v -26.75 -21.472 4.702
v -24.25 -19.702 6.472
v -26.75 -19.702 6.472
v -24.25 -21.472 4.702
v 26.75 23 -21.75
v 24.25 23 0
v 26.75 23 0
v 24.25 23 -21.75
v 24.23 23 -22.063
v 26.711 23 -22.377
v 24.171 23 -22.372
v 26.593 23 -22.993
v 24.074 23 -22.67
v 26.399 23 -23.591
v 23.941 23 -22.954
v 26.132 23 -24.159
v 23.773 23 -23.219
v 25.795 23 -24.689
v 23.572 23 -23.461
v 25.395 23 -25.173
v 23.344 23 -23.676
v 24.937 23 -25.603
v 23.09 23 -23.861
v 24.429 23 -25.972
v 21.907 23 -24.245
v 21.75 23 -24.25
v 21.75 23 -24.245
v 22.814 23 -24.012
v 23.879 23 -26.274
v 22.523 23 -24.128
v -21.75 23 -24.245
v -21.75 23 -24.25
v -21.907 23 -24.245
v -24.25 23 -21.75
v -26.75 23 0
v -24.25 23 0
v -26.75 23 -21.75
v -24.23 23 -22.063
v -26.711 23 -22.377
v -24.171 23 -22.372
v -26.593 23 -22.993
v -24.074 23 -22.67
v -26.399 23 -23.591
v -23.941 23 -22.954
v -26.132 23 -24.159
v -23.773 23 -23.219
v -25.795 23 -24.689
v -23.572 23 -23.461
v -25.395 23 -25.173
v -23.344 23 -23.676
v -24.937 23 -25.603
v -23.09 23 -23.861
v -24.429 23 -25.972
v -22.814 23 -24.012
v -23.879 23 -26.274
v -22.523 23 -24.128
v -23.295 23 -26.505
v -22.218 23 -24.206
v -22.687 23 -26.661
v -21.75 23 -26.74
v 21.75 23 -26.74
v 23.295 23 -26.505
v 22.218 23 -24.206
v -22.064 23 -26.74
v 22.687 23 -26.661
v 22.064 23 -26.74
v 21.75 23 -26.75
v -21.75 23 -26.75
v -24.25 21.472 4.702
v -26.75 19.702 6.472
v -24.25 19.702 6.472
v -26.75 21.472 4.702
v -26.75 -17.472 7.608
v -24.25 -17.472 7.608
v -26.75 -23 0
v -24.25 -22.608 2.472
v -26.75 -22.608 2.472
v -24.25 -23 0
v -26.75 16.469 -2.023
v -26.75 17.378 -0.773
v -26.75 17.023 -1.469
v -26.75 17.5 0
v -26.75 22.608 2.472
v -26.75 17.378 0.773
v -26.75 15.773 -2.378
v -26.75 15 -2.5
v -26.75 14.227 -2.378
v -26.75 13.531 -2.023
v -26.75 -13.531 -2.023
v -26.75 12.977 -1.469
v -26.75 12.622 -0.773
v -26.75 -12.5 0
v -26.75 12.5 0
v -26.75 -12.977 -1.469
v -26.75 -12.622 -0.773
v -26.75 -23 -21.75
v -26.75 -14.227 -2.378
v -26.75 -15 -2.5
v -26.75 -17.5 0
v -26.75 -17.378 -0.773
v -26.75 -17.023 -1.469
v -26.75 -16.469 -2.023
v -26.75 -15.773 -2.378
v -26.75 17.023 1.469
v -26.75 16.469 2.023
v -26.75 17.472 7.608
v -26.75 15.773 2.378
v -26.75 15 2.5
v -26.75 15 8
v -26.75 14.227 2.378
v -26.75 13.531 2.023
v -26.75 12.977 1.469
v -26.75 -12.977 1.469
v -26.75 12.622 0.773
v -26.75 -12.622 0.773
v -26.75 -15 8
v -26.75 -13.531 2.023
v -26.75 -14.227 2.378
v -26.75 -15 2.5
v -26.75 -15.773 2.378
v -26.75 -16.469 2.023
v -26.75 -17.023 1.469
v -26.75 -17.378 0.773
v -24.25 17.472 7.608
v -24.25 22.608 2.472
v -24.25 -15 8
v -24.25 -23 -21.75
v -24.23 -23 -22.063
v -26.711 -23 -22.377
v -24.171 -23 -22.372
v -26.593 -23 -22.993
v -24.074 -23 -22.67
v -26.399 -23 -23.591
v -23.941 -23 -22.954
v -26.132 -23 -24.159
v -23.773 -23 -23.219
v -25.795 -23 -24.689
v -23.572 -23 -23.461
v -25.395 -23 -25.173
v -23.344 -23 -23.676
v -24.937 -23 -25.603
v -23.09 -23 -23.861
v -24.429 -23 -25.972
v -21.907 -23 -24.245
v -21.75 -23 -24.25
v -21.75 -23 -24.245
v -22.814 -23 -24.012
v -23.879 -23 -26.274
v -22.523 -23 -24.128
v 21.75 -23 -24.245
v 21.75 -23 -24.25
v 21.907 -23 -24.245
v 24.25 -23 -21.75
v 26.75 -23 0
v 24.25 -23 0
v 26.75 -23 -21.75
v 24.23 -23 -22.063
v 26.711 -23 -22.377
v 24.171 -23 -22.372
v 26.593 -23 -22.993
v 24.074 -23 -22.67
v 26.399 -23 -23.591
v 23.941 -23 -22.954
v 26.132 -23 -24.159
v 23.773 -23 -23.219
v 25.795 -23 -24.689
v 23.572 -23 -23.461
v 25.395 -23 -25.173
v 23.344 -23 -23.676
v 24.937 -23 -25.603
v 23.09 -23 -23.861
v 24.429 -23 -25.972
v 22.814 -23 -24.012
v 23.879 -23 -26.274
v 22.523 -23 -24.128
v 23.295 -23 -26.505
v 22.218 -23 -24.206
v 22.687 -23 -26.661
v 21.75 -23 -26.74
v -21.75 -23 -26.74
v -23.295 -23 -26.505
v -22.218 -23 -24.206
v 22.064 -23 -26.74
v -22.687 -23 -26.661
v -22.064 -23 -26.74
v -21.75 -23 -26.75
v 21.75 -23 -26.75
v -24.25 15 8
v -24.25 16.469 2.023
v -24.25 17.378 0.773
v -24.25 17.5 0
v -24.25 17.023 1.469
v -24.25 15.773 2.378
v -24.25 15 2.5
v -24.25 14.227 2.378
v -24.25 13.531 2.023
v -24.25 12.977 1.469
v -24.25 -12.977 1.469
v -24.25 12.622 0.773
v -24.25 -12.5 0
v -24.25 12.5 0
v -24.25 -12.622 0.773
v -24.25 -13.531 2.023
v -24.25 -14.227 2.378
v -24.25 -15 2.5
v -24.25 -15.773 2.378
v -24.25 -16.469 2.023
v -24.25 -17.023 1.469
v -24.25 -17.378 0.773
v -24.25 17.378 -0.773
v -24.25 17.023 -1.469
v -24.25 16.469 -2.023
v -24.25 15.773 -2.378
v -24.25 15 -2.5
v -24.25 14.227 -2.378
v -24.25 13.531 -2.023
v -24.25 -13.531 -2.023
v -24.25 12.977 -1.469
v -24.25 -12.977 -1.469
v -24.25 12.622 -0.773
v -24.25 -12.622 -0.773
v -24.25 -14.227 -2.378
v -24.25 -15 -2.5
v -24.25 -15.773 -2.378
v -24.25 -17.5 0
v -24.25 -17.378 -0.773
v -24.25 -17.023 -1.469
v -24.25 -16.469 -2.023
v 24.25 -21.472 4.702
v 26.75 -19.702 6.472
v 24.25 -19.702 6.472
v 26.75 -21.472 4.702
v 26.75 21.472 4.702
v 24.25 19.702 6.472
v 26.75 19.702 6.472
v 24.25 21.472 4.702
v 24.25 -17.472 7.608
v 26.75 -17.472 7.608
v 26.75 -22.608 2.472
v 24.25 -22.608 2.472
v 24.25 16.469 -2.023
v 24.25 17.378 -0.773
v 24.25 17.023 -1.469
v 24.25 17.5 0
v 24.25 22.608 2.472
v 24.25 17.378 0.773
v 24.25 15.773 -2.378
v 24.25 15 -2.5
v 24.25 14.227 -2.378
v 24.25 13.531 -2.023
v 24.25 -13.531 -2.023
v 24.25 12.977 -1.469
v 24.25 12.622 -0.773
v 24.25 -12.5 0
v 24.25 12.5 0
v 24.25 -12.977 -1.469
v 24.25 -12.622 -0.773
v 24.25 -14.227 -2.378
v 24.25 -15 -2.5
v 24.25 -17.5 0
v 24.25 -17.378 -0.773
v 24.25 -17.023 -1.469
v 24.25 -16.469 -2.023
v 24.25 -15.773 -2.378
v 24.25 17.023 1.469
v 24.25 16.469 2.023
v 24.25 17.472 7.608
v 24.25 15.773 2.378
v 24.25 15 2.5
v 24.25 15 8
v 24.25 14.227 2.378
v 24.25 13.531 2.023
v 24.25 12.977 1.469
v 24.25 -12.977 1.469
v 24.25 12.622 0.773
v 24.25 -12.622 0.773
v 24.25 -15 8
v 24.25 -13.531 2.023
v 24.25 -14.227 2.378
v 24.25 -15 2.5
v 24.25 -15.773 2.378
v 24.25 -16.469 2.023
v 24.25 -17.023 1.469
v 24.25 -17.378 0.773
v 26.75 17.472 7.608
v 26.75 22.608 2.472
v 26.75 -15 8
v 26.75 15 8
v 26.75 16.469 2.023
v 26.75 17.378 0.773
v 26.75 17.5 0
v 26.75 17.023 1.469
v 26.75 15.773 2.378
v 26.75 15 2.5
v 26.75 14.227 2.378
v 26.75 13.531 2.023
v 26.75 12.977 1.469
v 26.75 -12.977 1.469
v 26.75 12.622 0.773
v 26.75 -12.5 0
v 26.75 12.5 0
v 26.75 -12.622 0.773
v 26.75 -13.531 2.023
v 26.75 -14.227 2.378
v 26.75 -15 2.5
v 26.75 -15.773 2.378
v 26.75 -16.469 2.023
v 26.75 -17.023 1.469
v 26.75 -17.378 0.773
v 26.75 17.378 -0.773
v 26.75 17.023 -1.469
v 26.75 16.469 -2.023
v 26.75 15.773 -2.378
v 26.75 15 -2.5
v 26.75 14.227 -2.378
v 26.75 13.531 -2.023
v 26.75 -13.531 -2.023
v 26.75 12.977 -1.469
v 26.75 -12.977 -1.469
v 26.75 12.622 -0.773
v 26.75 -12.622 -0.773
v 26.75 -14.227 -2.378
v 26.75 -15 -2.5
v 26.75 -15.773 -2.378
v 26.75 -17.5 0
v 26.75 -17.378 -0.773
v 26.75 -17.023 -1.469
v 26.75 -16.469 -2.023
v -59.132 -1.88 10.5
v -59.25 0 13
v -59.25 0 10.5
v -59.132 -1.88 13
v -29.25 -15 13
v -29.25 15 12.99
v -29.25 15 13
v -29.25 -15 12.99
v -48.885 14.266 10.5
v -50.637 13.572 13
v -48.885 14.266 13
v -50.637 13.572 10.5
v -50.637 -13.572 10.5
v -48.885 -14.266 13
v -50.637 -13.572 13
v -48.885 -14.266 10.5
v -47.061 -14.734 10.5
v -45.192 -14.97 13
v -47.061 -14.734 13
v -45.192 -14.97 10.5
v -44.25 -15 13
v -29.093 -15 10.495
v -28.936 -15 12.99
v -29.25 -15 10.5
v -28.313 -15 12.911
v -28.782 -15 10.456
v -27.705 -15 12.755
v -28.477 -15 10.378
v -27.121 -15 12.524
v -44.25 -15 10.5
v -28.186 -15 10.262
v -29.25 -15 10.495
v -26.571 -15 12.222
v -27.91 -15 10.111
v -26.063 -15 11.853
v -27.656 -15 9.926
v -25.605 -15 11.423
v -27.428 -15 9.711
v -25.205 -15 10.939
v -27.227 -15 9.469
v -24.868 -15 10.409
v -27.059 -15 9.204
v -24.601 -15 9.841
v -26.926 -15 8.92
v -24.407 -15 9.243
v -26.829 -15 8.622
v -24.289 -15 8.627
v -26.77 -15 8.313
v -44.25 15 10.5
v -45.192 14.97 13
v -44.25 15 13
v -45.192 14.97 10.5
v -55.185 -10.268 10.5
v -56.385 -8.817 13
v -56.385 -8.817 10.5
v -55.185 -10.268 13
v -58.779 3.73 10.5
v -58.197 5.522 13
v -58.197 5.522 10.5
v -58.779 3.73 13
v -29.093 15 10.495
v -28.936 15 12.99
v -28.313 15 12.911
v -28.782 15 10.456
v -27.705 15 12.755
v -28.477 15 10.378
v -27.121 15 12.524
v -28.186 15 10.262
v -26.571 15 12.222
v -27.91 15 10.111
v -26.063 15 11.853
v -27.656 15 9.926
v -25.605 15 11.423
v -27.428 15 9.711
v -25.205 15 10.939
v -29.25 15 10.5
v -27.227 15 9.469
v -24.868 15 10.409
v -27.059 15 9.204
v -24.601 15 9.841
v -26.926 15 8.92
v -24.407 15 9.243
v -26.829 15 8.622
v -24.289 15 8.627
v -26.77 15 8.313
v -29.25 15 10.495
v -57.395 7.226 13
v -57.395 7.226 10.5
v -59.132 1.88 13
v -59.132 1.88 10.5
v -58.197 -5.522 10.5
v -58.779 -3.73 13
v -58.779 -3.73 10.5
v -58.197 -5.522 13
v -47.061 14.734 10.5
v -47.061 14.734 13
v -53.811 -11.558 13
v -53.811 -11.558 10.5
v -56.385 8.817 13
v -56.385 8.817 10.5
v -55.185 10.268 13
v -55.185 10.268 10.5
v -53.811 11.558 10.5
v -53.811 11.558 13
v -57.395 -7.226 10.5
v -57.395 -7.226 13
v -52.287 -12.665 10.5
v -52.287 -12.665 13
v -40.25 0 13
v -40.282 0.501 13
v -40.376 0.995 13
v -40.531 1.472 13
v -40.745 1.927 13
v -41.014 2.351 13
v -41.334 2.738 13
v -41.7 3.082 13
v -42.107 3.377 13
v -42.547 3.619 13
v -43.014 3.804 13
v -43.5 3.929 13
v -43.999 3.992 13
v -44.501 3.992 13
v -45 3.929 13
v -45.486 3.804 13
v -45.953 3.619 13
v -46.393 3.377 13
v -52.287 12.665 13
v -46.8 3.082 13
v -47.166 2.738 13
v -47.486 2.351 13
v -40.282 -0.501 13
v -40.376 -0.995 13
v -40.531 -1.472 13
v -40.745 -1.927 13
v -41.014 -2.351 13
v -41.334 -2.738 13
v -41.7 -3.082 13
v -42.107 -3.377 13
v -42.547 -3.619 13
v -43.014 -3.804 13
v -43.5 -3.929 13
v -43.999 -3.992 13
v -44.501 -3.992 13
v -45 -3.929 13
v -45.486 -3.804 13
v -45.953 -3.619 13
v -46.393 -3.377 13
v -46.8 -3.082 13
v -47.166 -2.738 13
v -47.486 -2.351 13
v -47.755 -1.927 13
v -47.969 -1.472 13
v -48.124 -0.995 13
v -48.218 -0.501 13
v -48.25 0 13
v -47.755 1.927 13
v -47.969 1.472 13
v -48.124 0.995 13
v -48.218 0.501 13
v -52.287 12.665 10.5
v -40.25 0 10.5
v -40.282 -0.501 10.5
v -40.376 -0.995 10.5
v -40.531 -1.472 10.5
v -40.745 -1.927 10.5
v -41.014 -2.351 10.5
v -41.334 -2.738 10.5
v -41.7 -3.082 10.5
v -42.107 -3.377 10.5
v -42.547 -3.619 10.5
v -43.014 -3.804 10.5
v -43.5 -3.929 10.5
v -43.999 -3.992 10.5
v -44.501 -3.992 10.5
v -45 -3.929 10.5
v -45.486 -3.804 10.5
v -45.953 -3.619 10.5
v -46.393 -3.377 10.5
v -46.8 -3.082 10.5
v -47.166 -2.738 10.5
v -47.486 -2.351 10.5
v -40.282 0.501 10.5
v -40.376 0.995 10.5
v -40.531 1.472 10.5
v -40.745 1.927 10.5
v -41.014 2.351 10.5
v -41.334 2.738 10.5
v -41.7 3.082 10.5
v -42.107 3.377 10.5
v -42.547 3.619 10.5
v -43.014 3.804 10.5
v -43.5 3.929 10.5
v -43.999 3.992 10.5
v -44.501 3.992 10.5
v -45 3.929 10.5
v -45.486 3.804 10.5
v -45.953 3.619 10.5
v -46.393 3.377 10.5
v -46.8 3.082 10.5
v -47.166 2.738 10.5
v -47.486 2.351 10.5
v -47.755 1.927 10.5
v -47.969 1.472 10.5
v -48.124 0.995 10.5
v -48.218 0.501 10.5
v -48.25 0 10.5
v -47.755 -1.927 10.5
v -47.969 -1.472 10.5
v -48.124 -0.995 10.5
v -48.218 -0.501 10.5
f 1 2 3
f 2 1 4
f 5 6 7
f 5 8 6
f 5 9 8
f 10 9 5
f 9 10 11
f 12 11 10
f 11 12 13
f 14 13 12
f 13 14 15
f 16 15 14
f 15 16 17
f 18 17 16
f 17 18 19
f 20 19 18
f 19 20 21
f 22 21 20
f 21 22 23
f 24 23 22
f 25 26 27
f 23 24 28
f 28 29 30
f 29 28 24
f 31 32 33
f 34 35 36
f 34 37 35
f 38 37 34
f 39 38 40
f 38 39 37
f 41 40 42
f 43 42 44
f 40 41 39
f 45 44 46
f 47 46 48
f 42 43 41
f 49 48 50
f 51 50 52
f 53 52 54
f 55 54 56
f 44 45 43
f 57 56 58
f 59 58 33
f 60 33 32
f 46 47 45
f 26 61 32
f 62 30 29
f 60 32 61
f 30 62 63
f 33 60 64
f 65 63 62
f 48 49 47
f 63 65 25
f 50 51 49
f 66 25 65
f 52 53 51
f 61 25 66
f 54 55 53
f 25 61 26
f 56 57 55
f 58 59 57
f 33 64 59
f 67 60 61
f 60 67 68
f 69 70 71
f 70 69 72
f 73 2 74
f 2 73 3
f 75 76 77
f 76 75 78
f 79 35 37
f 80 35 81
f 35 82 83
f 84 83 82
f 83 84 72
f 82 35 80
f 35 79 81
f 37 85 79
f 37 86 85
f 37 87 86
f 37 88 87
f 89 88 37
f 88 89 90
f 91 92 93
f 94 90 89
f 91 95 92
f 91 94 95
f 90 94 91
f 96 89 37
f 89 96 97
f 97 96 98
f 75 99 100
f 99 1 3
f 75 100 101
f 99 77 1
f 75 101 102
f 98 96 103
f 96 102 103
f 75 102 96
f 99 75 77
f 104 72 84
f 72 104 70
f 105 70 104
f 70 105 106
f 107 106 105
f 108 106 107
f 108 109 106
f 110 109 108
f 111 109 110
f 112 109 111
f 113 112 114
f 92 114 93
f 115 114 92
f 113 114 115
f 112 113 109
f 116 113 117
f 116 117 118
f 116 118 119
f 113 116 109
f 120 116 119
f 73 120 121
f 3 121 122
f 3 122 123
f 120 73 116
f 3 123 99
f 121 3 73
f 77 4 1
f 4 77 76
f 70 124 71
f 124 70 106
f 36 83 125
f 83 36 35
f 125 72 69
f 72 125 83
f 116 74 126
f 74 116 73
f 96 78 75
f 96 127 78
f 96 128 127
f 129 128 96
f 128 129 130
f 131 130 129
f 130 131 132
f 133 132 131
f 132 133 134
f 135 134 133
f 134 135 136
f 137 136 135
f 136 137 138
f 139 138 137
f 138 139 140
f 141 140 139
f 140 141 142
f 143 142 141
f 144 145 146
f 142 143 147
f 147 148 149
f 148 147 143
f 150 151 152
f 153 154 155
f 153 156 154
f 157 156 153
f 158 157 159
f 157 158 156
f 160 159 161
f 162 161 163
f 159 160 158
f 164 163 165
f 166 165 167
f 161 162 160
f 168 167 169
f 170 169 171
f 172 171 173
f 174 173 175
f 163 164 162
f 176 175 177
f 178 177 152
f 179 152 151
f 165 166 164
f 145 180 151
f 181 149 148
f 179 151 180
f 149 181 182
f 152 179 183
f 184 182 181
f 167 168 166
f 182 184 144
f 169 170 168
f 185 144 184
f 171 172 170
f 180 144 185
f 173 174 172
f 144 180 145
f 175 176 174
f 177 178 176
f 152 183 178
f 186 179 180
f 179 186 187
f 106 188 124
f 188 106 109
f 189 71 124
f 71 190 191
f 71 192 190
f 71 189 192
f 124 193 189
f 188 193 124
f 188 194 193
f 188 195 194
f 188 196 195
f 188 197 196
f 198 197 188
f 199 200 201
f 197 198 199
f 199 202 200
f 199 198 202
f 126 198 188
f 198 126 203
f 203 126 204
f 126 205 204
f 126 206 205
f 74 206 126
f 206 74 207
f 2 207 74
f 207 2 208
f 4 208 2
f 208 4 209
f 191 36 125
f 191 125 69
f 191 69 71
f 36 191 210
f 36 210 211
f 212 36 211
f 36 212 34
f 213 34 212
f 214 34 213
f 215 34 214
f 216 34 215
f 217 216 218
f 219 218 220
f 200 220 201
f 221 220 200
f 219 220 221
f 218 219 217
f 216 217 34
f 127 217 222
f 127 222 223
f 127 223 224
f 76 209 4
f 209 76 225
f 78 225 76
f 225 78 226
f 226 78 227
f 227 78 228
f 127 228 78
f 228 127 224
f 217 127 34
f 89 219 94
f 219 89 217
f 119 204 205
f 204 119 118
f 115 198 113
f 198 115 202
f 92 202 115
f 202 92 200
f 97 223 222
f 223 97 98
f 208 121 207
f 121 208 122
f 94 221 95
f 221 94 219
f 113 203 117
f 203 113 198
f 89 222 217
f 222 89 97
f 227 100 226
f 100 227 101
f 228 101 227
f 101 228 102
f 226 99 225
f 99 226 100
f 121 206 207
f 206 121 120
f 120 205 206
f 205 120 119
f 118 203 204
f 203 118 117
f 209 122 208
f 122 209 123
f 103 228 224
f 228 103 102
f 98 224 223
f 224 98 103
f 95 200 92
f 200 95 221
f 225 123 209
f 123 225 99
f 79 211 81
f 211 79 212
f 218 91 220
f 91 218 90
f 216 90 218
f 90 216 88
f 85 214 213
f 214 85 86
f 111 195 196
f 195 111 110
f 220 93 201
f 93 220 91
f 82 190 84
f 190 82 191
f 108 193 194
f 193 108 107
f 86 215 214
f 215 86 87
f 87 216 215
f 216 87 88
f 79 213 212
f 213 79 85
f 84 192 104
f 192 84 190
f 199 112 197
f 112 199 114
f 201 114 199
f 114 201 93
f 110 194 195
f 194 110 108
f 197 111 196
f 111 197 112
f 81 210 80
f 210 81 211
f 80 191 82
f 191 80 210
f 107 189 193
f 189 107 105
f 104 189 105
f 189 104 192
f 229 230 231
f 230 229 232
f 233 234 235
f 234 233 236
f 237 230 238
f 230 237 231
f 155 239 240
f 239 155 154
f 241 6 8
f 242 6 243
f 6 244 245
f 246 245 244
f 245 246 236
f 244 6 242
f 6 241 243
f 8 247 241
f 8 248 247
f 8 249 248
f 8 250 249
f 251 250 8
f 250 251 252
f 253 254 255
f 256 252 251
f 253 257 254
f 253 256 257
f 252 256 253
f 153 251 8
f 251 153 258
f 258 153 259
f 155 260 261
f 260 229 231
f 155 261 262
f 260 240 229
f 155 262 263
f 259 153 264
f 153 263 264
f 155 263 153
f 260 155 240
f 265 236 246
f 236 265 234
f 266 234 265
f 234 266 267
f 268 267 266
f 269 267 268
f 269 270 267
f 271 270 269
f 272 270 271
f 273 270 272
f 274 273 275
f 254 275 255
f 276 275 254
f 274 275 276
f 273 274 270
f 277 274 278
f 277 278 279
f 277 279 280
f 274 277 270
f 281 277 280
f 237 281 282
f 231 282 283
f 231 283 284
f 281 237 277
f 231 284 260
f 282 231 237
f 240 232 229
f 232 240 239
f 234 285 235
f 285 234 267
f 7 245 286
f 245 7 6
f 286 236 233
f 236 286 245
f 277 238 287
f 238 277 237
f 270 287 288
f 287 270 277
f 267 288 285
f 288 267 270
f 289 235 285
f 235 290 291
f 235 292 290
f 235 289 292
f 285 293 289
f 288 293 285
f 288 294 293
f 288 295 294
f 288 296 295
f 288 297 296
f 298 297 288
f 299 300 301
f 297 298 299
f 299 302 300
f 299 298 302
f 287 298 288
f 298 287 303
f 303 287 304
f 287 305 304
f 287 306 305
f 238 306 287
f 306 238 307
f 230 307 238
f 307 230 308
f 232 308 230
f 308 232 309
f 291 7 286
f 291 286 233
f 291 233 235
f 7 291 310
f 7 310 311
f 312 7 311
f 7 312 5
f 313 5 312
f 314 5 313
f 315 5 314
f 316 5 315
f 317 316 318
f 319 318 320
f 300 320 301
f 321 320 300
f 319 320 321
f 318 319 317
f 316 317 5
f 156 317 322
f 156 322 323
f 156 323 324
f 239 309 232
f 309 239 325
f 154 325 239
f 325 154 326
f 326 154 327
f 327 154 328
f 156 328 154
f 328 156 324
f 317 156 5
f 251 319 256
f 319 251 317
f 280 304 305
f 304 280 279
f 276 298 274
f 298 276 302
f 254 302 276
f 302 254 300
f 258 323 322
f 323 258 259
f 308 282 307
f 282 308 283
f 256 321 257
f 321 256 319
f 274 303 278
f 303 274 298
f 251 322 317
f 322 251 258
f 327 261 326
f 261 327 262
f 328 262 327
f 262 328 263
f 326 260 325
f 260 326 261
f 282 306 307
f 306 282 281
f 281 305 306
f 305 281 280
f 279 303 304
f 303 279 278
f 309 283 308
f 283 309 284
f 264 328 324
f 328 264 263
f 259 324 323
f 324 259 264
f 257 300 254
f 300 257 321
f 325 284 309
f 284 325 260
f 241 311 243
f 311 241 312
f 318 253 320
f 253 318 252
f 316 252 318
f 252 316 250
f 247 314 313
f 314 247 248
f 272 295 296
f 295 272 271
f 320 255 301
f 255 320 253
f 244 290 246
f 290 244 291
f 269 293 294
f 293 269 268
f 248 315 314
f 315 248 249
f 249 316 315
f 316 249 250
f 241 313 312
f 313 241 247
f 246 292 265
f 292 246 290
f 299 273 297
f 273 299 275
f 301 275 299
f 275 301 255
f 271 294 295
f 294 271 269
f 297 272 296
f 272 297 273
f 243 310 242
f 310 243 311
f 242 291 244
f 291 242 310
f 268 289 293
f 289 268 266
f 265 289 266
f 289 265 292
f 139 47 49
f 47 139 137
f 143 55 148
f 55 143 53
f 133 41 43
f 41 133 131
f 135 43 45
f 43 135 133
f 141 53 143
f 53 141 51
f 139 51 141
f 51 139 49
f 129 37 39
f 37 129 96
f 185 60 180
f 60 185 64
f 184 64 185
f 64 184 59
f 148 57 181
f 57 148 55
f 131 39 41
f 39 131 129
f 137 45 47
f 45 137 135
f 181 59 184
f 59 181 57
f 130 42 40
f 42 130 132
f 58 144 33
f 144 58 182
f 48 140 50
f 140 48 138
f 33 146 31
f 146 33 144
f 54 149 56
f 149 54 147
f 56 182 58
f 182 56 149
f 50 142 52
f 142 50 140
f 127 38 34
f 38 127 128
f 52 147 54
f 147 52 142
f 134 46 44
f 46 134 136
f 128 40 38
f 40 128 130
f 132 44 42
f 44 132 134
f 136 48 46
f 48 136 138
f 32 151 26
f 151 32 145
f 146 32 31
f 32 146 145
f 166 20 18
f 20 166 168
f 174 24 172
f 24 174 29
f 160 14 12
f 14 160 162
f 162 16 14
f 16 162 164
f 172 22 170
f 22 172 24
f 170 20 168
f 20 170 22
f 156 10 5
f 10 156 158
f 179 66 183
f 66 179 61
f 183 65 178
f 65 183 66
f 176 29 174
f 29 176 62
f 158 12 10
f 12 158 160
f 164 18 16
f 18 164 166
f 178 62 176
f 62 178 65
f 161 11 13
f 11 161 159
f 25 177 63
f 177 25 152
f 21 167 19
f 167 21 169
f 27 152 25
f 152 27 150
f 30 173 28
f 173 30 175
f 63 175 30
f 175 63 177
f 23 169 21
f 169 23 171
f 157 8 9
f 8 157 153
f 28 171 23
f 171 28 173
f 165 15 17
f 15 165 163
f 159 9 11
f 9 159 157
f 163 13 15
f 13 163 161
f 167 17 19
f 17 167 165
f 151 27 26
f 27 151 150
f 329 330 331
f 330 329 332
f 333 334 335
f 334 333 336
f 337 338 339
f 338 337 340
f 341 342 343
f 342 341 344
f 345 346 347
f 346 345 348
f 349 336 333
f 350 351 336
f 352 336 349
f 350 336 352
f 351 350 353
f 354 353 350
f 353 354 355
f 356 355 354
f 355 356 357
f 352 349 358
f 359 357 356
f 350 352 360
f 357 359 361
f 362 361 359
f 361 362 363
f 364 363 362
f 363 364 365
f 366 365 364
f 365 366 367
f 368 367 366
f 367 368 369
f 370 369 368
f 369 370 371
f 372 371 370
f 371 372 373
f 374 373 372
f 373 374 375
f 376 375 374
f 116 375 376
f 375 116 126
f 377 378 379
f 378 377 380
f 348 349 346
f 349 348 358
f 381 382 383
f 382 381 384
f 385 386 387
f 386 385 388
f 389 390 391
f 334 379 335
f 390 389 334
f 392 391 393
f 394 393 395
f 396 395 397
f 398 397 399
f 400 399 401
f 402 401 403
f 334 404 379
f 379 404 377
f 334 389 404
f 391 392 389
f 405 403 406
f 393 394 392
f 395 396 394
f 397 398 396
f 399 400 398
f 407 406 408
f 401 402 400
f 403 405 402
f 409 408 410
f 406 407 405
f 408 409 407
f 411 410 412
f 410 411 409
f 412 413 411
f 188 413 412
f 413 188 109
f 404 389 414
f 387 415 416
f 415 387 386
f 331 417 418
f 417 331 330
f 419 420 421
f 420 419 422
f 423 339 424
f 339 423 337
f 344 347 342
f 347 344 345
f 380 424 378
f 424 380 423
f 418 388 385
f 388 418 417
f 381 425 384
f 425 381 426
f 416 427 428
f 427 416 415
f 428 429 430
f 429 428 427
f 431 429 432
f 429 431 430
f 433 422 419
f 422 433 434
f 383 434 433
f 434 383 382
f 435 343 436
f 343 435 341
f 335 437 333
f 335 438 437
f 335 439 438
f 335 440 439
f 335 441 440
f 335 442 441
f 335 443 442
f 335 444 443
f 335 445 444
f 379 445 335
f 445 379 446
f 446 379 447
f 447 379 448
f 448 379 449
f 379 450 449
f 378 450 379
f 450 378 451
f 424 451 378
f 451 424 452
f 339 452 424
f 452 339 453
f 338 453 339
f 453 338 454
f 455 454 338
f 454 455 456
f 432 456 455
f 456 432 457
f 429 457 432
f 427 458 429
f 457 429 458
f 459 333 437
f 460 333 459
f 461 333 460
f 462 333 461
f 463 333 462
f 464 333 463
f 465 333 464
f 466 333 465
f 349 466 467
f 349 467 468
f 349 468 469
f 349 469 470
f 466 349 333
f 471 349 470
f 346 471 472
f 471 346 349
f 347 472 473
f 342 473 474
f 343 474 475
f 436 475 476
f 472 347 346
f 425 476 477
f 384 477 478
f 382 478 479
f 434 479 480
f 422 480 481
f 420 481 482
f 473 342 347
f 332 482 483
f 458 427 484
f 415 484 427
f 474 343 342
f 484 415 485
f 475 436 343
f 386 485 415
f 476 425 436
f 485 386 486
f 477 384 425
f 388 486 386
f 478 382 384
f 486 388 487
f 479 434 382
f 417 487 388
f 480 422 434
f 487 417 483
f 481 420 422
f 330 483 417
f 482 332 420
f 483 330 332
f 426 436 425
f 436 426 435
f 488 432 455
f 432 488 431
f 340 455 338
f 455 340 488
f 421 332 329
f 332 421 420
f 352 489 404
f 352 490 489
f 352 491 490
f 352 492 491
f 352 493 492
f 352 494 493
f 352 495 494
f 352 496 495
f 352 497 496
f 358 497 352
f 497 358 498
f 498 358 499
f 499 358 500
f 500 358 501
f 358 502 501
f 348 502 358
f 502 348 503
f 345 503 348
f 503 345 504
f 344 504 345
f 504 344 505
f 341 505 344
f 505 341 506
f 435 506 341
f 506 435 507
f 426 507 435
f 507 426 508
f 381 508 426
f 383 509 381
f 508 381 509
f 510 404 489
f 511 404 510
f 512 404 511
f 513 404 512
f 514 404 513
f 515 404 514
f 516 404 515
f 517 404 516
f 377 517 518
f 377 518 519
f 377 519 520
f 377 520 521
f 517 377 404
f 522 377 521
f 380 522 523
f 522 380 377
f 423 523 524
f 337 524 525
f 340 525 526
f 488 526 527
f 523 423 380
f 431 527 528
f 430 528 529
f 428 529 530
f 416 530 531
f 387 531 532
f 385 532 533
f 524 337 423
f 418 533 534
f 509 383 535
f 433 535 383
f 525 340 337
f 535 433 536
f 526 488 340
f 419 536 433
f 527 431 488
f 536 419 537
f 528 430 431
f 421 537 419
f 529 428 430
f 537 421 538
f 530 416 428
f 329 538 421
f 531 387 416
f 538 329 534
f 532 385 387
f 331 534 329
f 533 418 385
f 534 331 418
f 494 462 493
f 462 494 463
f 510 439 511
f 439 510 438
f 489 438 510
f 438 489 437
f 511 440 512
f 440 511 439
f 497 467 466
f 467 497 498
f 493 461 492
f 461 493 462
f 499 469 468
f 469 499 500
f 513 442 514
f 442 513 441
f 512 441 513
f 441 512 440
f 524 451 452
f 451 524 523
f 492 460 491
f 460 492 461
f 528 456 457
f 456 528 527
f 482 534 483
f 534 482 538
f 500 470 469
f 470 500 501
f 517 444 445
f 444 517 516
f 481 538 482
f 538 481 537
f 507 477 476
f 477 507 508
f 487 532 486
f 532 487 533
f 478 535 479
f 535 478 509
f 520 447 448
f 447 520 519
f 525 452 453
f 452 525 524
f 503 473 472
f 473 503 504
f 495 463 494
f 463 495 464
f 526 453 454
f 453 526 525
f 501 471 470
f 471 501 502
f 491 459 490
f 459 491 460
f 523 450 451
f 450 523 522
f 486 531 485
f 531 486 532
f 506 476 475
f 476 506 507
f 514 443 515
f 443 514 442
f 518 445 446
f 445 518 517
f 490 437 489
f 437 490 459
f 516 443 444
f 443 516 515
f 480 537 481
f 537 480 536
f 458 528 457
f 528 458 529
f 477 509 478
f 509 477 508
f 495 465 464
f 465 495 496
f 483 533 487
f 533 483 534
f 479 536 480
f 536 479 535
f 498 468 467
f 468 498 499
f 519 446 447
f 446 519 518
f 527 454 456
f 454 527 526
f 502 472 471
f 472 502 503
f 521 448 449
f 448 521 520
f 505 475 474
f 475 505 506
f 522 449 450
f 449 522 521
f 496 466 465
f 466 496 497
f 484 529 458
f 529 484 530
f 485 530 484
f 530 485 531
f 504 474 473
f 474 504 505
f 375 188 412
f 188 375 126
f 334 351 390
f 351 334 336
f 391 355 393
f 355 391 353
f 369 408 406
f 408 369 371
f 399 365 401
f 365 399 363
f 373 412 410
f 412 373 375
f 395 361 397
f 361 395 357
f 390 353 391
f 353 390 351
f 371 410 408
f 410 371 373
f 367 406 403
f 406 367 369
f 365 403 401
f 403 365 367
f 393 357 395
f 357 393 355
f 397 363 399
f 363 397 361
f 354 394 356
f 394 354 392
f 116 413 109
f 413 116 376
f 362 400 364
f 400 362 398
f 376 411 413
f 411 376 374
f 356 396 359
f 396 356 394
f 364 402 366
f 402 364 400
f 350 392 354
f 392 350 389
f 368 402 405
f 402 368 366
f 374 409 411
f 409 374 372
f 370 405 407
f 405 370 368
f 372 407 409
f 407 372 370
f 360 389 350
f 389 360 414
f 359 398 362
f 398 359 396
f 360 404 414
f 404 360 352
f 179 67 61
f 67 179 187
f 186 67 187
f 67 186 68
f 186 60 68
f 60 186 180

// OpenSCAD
//RudderSupport(50,0,-30);
RudderSupport();


    thicns = 2.5;
    tubeDia = 48.5;
    cornerRad = 8;
    height1=21.75;
    wid1 = 46;  // platform side A
    platfSideB = tubeDia - 2*thicns;
    width1=30;
    rudderBoltRad = 4;
    rudderEarRad = 15;
    holeRad = 2.5;

module RudderSupport() {
    
    $fn=50;
    
    pz = 0;// - height1;
    px = 0; //+ tubeDia;
    py = 0; 
    
    translate([px-platfSideB/2-3*thicns/2,py,pz])    Side();
    translate([px+platfSideB/2+3*thicns/2,py,pz])     Side();
    
    //платформа
    translate([px, py, pz-3*thicns/2 - height1  ]) 
    cube([platfSideB, wid1, thicns],center=true);
    
    //изгибы охватов
    translate([-platfSideB/2,0,-height1])    Izgib();
    translate([platfSideB/2,0,-height1]) rotate([0,0,180])   Izgib();

    // ухо руля
    translate([ px-rudderEarRad -platfSideB/2 -3*thicns 
              , py
              , pz + cornerRad + 3*thicns/2
              ]) RudderEar();

    translate([ px-platfSideB/2-3*thicns
              , py
              , pz +cornerRad
              ]) Izgib1();

}

module Side() {
    $fn=20;
    
    difference() {
        hull() {    
            translate([0,0, -height1/2]) 
            cube([thicns, (width1+2*cornerRad), height1],center=true);

            translate([0,-width1/2 , 0]) 
            rotate([0,90,0]) 
            cylinder(h=thicns, r=cornerRad,center=true);

            translate([0, width1/2, ]) 
            rotate([0,90,0]) 
            cylinder(h=thicns, r=cornerRad,center=true);
        }
        translate([0, -width1/2, 0]) 
        rotate([0,90,0]) 
        cylinder(h=thicns*3, r=holeRad,center=true);

        translate([0, width1/2, 0]) 
        rotate([0,90,0]) 
        cylinder(h=thicns*3, r=holeRad,center=true);
    }
}


module Izgib() {
    difference(){    
        rotate([-90,0,0]) 
        cylinder(h=wid1,r=thicns*2,center=true);

        rotate([-90,0,0]) 
        cylinder(h=wid1+2,r=thicns,center=true);

        translate([thicns*3/2,0,thicns/2]) 
        cube([thicns*3, wid1+2, thicns*3],center=true);

        translate([thicns/2,0,3*thicns/2]) 
        cube([thicns*3, wid1+2, thicns*3],center=true);
    }    
}    

module Izgib1() {
    difference() { 
            rotate([-90,0,0]) 
            cylinder(h=width1, r=thicns*2,center=true);

            rotate([-90,0,0]) 
            cylinder(h=width1+2, r=thicns,center=true);

            translate([-thicns/2,0,-3*thicns/2]) 
            cube([thicns*3, width1+2  , thicns*3],center=true);

            translate([-3*thicns/2,0,-thicns/2]) 
            cube([thicns*3, width1+2  , thicns*3],center=true);
    }
}

module RudderEar() {
    difference() {
        hull() {
            cylinder(h=thicns, r=rudderEarRad,center=true);

            translate([rudderEarRad/2,0,0])
            cube([rudderEarRad, rudderEarRad*2  , thicns],center=true);
        }
        cylinder(h=thicns*3, r=rudderBoltRad,center=true);
    }
}
